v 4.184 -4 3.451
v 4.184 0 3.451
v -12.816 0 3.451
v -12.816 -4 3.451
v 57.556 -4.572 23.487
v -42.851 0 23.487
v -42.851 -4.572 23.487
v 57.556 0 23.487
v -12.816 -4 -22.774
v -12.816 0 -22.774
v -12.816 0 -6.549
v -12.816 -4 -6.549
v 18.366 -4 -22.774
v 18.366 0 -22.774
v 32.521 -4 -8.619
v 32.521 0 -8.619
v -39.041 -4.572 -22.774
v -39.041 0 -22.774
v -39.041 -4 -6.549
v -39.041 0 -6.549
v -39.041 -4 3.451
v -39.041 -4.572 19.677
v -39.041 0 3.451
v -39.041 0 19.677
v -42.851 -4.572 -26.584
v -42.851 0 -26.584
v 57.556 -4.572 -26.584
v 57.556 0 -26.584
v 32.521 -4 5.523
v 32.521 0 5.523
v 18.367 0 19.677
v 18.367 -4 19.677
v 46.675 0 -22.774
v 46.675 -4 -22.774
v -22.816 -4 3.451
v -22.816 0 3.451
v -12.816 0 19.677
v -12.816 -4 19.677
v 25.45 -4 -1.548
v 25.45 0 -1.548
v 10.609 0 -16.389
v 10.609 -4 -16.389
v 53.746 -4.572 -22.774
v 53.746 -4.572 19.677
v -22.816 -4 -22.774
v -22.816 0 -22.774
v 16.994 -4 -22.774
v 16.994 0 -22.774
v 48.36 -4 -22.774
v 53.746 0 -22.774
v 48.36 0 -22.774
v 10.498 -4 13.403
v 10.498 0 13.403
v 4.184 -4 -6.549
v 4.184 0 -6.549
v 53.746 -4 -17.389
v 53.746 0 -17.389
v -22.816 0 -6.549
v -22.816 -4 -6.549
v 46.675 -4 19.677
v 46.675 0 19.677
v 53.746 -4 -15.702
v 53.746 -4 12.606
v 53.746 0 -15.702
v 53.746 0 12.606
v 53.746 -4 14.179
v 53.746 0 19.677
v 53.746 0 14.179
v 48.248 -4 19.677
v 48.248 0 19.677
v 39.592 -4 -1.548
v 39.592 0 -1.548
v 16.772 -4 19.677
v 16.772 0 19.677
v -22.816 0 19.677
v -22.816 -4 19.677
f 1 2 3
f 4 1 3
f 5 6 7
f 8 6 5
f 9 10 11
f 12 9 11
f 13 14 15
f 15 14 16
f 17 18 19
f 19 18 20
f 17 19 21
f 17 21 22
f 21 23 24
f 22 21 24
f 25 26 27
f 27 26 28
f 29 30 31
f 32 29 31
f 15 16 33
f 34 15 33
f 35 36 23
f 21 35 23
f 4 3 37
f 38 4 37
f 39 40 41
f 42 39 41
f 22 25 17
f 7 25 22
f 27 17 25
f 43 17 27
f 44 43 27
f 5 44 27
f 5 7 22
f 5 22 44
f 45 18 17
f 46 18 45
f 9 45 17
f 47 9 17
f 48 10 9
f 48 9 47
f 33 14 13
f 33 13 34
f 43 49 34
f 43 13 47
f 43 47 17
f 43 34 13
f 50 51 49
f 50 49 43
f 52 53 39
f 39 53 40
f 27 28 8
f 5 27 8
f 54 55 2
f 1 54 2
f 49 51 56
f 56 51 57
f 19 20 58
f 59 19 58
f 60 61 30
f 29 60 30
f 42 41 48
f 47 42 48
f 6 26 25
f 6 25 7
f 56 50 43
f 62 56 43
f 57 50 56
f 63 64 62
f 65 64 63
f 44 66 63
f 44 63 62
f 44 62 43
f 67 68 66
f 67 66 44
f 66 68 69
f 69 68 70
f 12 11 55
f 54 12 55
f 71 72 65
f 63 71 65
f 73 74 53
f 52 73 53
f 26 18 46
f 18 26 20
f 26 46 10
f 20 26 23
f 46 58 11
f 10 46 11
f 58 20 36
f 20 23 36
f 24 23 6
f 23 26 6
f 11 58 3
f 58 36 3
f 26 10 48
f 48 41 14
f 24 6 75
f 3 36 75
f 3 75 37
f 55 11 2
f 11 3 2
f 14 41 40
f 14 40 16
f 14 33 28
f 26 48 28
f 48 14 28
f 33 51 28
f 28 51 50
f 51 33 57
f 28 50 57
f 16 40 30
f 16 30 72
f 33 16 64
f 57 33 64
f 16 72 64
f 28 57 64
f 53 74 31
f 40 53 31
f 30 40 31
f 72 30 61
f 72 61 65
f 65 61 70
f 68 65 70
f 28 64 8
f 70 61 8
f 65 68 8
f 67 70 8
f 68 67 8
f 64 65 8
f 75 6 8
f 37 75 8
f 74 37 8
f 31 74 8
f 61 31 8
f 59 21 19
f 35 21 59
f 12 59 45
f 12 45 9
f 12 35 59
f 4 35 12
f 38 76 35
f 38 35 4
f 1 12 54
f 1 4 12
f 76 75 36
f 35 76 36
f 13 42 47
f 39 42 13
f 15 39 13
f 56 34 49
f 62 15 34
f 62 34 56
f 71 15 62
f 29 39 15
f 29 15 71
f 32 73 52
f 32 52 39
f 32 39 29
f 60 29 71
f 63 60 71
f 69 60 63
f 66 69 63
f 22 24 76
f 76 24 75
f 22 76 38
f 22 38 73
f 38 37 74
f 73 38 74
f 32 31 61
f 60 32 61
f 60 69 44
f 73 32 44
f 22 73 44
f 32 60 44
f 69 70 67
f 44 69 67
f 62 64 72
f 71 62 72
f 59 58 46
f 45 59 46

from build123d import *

# Parameters (mm, degrees)
F0_W     = 100.4062
F0_H     = 50.070776
F0_W_2   = 92.786201
F0_H_2   = 42.450776
F1_DEPTH = 4.572
F3_DEPTH = 4
F5_DEPTH = 4


with BuildPart() as f1:
    # F0 (on Front) → F1 (new body)
    with BuildSketch(Plane.XZ):
        with Locations((7.352479, -1.548582)):
            Rectangle(F0_W, F0_H)
        with Locations((7.352479, -1.548582)):
            Rectangle(F0_W_2, F0_H_2, mode=Mode.SUBTRACT)
    extrude(amount=F1_DEPTH)

    # F2 (on Front) → F3 (join)
    with BuildSketch(Plane.XZ):
        Polygon((47.517822, -23.616505), (54.588892, -16.545439), (39.591647, -1.548194), (54.532303, 13.392463), (47.461235, 20.463531), (32.520579, 5.522874), (17.569123, 20.47433), (10.498055, 13.403262), (25.449511, -1.548194), (10.608977, -16.388728), (17.680045, -23.459796), (32.520579, -8.619261), align=None)
    extrude(amount=F3_DEPTH)

    # F4 (on Front) → F5 (join)
    with BuildSketch(Plane.XZ):
        Polygon((-39.815622, 3.45103), (-39.815622, -6.54897), (-22.815622, -6.54897), (-22.815622, -23.54897), (-12.815622, -23.54897), (-12.815622, -6.54897), (4.184378, -6.54897), (4.184378, 3.45103), (-12.815622, 3.45103), (-12.815622, 20.45103), (-22.815622, 20.45103), (-22.815622, 3.45103), align=None)
    extrude(amount=F5_DEPTH)


solid = f1.part
